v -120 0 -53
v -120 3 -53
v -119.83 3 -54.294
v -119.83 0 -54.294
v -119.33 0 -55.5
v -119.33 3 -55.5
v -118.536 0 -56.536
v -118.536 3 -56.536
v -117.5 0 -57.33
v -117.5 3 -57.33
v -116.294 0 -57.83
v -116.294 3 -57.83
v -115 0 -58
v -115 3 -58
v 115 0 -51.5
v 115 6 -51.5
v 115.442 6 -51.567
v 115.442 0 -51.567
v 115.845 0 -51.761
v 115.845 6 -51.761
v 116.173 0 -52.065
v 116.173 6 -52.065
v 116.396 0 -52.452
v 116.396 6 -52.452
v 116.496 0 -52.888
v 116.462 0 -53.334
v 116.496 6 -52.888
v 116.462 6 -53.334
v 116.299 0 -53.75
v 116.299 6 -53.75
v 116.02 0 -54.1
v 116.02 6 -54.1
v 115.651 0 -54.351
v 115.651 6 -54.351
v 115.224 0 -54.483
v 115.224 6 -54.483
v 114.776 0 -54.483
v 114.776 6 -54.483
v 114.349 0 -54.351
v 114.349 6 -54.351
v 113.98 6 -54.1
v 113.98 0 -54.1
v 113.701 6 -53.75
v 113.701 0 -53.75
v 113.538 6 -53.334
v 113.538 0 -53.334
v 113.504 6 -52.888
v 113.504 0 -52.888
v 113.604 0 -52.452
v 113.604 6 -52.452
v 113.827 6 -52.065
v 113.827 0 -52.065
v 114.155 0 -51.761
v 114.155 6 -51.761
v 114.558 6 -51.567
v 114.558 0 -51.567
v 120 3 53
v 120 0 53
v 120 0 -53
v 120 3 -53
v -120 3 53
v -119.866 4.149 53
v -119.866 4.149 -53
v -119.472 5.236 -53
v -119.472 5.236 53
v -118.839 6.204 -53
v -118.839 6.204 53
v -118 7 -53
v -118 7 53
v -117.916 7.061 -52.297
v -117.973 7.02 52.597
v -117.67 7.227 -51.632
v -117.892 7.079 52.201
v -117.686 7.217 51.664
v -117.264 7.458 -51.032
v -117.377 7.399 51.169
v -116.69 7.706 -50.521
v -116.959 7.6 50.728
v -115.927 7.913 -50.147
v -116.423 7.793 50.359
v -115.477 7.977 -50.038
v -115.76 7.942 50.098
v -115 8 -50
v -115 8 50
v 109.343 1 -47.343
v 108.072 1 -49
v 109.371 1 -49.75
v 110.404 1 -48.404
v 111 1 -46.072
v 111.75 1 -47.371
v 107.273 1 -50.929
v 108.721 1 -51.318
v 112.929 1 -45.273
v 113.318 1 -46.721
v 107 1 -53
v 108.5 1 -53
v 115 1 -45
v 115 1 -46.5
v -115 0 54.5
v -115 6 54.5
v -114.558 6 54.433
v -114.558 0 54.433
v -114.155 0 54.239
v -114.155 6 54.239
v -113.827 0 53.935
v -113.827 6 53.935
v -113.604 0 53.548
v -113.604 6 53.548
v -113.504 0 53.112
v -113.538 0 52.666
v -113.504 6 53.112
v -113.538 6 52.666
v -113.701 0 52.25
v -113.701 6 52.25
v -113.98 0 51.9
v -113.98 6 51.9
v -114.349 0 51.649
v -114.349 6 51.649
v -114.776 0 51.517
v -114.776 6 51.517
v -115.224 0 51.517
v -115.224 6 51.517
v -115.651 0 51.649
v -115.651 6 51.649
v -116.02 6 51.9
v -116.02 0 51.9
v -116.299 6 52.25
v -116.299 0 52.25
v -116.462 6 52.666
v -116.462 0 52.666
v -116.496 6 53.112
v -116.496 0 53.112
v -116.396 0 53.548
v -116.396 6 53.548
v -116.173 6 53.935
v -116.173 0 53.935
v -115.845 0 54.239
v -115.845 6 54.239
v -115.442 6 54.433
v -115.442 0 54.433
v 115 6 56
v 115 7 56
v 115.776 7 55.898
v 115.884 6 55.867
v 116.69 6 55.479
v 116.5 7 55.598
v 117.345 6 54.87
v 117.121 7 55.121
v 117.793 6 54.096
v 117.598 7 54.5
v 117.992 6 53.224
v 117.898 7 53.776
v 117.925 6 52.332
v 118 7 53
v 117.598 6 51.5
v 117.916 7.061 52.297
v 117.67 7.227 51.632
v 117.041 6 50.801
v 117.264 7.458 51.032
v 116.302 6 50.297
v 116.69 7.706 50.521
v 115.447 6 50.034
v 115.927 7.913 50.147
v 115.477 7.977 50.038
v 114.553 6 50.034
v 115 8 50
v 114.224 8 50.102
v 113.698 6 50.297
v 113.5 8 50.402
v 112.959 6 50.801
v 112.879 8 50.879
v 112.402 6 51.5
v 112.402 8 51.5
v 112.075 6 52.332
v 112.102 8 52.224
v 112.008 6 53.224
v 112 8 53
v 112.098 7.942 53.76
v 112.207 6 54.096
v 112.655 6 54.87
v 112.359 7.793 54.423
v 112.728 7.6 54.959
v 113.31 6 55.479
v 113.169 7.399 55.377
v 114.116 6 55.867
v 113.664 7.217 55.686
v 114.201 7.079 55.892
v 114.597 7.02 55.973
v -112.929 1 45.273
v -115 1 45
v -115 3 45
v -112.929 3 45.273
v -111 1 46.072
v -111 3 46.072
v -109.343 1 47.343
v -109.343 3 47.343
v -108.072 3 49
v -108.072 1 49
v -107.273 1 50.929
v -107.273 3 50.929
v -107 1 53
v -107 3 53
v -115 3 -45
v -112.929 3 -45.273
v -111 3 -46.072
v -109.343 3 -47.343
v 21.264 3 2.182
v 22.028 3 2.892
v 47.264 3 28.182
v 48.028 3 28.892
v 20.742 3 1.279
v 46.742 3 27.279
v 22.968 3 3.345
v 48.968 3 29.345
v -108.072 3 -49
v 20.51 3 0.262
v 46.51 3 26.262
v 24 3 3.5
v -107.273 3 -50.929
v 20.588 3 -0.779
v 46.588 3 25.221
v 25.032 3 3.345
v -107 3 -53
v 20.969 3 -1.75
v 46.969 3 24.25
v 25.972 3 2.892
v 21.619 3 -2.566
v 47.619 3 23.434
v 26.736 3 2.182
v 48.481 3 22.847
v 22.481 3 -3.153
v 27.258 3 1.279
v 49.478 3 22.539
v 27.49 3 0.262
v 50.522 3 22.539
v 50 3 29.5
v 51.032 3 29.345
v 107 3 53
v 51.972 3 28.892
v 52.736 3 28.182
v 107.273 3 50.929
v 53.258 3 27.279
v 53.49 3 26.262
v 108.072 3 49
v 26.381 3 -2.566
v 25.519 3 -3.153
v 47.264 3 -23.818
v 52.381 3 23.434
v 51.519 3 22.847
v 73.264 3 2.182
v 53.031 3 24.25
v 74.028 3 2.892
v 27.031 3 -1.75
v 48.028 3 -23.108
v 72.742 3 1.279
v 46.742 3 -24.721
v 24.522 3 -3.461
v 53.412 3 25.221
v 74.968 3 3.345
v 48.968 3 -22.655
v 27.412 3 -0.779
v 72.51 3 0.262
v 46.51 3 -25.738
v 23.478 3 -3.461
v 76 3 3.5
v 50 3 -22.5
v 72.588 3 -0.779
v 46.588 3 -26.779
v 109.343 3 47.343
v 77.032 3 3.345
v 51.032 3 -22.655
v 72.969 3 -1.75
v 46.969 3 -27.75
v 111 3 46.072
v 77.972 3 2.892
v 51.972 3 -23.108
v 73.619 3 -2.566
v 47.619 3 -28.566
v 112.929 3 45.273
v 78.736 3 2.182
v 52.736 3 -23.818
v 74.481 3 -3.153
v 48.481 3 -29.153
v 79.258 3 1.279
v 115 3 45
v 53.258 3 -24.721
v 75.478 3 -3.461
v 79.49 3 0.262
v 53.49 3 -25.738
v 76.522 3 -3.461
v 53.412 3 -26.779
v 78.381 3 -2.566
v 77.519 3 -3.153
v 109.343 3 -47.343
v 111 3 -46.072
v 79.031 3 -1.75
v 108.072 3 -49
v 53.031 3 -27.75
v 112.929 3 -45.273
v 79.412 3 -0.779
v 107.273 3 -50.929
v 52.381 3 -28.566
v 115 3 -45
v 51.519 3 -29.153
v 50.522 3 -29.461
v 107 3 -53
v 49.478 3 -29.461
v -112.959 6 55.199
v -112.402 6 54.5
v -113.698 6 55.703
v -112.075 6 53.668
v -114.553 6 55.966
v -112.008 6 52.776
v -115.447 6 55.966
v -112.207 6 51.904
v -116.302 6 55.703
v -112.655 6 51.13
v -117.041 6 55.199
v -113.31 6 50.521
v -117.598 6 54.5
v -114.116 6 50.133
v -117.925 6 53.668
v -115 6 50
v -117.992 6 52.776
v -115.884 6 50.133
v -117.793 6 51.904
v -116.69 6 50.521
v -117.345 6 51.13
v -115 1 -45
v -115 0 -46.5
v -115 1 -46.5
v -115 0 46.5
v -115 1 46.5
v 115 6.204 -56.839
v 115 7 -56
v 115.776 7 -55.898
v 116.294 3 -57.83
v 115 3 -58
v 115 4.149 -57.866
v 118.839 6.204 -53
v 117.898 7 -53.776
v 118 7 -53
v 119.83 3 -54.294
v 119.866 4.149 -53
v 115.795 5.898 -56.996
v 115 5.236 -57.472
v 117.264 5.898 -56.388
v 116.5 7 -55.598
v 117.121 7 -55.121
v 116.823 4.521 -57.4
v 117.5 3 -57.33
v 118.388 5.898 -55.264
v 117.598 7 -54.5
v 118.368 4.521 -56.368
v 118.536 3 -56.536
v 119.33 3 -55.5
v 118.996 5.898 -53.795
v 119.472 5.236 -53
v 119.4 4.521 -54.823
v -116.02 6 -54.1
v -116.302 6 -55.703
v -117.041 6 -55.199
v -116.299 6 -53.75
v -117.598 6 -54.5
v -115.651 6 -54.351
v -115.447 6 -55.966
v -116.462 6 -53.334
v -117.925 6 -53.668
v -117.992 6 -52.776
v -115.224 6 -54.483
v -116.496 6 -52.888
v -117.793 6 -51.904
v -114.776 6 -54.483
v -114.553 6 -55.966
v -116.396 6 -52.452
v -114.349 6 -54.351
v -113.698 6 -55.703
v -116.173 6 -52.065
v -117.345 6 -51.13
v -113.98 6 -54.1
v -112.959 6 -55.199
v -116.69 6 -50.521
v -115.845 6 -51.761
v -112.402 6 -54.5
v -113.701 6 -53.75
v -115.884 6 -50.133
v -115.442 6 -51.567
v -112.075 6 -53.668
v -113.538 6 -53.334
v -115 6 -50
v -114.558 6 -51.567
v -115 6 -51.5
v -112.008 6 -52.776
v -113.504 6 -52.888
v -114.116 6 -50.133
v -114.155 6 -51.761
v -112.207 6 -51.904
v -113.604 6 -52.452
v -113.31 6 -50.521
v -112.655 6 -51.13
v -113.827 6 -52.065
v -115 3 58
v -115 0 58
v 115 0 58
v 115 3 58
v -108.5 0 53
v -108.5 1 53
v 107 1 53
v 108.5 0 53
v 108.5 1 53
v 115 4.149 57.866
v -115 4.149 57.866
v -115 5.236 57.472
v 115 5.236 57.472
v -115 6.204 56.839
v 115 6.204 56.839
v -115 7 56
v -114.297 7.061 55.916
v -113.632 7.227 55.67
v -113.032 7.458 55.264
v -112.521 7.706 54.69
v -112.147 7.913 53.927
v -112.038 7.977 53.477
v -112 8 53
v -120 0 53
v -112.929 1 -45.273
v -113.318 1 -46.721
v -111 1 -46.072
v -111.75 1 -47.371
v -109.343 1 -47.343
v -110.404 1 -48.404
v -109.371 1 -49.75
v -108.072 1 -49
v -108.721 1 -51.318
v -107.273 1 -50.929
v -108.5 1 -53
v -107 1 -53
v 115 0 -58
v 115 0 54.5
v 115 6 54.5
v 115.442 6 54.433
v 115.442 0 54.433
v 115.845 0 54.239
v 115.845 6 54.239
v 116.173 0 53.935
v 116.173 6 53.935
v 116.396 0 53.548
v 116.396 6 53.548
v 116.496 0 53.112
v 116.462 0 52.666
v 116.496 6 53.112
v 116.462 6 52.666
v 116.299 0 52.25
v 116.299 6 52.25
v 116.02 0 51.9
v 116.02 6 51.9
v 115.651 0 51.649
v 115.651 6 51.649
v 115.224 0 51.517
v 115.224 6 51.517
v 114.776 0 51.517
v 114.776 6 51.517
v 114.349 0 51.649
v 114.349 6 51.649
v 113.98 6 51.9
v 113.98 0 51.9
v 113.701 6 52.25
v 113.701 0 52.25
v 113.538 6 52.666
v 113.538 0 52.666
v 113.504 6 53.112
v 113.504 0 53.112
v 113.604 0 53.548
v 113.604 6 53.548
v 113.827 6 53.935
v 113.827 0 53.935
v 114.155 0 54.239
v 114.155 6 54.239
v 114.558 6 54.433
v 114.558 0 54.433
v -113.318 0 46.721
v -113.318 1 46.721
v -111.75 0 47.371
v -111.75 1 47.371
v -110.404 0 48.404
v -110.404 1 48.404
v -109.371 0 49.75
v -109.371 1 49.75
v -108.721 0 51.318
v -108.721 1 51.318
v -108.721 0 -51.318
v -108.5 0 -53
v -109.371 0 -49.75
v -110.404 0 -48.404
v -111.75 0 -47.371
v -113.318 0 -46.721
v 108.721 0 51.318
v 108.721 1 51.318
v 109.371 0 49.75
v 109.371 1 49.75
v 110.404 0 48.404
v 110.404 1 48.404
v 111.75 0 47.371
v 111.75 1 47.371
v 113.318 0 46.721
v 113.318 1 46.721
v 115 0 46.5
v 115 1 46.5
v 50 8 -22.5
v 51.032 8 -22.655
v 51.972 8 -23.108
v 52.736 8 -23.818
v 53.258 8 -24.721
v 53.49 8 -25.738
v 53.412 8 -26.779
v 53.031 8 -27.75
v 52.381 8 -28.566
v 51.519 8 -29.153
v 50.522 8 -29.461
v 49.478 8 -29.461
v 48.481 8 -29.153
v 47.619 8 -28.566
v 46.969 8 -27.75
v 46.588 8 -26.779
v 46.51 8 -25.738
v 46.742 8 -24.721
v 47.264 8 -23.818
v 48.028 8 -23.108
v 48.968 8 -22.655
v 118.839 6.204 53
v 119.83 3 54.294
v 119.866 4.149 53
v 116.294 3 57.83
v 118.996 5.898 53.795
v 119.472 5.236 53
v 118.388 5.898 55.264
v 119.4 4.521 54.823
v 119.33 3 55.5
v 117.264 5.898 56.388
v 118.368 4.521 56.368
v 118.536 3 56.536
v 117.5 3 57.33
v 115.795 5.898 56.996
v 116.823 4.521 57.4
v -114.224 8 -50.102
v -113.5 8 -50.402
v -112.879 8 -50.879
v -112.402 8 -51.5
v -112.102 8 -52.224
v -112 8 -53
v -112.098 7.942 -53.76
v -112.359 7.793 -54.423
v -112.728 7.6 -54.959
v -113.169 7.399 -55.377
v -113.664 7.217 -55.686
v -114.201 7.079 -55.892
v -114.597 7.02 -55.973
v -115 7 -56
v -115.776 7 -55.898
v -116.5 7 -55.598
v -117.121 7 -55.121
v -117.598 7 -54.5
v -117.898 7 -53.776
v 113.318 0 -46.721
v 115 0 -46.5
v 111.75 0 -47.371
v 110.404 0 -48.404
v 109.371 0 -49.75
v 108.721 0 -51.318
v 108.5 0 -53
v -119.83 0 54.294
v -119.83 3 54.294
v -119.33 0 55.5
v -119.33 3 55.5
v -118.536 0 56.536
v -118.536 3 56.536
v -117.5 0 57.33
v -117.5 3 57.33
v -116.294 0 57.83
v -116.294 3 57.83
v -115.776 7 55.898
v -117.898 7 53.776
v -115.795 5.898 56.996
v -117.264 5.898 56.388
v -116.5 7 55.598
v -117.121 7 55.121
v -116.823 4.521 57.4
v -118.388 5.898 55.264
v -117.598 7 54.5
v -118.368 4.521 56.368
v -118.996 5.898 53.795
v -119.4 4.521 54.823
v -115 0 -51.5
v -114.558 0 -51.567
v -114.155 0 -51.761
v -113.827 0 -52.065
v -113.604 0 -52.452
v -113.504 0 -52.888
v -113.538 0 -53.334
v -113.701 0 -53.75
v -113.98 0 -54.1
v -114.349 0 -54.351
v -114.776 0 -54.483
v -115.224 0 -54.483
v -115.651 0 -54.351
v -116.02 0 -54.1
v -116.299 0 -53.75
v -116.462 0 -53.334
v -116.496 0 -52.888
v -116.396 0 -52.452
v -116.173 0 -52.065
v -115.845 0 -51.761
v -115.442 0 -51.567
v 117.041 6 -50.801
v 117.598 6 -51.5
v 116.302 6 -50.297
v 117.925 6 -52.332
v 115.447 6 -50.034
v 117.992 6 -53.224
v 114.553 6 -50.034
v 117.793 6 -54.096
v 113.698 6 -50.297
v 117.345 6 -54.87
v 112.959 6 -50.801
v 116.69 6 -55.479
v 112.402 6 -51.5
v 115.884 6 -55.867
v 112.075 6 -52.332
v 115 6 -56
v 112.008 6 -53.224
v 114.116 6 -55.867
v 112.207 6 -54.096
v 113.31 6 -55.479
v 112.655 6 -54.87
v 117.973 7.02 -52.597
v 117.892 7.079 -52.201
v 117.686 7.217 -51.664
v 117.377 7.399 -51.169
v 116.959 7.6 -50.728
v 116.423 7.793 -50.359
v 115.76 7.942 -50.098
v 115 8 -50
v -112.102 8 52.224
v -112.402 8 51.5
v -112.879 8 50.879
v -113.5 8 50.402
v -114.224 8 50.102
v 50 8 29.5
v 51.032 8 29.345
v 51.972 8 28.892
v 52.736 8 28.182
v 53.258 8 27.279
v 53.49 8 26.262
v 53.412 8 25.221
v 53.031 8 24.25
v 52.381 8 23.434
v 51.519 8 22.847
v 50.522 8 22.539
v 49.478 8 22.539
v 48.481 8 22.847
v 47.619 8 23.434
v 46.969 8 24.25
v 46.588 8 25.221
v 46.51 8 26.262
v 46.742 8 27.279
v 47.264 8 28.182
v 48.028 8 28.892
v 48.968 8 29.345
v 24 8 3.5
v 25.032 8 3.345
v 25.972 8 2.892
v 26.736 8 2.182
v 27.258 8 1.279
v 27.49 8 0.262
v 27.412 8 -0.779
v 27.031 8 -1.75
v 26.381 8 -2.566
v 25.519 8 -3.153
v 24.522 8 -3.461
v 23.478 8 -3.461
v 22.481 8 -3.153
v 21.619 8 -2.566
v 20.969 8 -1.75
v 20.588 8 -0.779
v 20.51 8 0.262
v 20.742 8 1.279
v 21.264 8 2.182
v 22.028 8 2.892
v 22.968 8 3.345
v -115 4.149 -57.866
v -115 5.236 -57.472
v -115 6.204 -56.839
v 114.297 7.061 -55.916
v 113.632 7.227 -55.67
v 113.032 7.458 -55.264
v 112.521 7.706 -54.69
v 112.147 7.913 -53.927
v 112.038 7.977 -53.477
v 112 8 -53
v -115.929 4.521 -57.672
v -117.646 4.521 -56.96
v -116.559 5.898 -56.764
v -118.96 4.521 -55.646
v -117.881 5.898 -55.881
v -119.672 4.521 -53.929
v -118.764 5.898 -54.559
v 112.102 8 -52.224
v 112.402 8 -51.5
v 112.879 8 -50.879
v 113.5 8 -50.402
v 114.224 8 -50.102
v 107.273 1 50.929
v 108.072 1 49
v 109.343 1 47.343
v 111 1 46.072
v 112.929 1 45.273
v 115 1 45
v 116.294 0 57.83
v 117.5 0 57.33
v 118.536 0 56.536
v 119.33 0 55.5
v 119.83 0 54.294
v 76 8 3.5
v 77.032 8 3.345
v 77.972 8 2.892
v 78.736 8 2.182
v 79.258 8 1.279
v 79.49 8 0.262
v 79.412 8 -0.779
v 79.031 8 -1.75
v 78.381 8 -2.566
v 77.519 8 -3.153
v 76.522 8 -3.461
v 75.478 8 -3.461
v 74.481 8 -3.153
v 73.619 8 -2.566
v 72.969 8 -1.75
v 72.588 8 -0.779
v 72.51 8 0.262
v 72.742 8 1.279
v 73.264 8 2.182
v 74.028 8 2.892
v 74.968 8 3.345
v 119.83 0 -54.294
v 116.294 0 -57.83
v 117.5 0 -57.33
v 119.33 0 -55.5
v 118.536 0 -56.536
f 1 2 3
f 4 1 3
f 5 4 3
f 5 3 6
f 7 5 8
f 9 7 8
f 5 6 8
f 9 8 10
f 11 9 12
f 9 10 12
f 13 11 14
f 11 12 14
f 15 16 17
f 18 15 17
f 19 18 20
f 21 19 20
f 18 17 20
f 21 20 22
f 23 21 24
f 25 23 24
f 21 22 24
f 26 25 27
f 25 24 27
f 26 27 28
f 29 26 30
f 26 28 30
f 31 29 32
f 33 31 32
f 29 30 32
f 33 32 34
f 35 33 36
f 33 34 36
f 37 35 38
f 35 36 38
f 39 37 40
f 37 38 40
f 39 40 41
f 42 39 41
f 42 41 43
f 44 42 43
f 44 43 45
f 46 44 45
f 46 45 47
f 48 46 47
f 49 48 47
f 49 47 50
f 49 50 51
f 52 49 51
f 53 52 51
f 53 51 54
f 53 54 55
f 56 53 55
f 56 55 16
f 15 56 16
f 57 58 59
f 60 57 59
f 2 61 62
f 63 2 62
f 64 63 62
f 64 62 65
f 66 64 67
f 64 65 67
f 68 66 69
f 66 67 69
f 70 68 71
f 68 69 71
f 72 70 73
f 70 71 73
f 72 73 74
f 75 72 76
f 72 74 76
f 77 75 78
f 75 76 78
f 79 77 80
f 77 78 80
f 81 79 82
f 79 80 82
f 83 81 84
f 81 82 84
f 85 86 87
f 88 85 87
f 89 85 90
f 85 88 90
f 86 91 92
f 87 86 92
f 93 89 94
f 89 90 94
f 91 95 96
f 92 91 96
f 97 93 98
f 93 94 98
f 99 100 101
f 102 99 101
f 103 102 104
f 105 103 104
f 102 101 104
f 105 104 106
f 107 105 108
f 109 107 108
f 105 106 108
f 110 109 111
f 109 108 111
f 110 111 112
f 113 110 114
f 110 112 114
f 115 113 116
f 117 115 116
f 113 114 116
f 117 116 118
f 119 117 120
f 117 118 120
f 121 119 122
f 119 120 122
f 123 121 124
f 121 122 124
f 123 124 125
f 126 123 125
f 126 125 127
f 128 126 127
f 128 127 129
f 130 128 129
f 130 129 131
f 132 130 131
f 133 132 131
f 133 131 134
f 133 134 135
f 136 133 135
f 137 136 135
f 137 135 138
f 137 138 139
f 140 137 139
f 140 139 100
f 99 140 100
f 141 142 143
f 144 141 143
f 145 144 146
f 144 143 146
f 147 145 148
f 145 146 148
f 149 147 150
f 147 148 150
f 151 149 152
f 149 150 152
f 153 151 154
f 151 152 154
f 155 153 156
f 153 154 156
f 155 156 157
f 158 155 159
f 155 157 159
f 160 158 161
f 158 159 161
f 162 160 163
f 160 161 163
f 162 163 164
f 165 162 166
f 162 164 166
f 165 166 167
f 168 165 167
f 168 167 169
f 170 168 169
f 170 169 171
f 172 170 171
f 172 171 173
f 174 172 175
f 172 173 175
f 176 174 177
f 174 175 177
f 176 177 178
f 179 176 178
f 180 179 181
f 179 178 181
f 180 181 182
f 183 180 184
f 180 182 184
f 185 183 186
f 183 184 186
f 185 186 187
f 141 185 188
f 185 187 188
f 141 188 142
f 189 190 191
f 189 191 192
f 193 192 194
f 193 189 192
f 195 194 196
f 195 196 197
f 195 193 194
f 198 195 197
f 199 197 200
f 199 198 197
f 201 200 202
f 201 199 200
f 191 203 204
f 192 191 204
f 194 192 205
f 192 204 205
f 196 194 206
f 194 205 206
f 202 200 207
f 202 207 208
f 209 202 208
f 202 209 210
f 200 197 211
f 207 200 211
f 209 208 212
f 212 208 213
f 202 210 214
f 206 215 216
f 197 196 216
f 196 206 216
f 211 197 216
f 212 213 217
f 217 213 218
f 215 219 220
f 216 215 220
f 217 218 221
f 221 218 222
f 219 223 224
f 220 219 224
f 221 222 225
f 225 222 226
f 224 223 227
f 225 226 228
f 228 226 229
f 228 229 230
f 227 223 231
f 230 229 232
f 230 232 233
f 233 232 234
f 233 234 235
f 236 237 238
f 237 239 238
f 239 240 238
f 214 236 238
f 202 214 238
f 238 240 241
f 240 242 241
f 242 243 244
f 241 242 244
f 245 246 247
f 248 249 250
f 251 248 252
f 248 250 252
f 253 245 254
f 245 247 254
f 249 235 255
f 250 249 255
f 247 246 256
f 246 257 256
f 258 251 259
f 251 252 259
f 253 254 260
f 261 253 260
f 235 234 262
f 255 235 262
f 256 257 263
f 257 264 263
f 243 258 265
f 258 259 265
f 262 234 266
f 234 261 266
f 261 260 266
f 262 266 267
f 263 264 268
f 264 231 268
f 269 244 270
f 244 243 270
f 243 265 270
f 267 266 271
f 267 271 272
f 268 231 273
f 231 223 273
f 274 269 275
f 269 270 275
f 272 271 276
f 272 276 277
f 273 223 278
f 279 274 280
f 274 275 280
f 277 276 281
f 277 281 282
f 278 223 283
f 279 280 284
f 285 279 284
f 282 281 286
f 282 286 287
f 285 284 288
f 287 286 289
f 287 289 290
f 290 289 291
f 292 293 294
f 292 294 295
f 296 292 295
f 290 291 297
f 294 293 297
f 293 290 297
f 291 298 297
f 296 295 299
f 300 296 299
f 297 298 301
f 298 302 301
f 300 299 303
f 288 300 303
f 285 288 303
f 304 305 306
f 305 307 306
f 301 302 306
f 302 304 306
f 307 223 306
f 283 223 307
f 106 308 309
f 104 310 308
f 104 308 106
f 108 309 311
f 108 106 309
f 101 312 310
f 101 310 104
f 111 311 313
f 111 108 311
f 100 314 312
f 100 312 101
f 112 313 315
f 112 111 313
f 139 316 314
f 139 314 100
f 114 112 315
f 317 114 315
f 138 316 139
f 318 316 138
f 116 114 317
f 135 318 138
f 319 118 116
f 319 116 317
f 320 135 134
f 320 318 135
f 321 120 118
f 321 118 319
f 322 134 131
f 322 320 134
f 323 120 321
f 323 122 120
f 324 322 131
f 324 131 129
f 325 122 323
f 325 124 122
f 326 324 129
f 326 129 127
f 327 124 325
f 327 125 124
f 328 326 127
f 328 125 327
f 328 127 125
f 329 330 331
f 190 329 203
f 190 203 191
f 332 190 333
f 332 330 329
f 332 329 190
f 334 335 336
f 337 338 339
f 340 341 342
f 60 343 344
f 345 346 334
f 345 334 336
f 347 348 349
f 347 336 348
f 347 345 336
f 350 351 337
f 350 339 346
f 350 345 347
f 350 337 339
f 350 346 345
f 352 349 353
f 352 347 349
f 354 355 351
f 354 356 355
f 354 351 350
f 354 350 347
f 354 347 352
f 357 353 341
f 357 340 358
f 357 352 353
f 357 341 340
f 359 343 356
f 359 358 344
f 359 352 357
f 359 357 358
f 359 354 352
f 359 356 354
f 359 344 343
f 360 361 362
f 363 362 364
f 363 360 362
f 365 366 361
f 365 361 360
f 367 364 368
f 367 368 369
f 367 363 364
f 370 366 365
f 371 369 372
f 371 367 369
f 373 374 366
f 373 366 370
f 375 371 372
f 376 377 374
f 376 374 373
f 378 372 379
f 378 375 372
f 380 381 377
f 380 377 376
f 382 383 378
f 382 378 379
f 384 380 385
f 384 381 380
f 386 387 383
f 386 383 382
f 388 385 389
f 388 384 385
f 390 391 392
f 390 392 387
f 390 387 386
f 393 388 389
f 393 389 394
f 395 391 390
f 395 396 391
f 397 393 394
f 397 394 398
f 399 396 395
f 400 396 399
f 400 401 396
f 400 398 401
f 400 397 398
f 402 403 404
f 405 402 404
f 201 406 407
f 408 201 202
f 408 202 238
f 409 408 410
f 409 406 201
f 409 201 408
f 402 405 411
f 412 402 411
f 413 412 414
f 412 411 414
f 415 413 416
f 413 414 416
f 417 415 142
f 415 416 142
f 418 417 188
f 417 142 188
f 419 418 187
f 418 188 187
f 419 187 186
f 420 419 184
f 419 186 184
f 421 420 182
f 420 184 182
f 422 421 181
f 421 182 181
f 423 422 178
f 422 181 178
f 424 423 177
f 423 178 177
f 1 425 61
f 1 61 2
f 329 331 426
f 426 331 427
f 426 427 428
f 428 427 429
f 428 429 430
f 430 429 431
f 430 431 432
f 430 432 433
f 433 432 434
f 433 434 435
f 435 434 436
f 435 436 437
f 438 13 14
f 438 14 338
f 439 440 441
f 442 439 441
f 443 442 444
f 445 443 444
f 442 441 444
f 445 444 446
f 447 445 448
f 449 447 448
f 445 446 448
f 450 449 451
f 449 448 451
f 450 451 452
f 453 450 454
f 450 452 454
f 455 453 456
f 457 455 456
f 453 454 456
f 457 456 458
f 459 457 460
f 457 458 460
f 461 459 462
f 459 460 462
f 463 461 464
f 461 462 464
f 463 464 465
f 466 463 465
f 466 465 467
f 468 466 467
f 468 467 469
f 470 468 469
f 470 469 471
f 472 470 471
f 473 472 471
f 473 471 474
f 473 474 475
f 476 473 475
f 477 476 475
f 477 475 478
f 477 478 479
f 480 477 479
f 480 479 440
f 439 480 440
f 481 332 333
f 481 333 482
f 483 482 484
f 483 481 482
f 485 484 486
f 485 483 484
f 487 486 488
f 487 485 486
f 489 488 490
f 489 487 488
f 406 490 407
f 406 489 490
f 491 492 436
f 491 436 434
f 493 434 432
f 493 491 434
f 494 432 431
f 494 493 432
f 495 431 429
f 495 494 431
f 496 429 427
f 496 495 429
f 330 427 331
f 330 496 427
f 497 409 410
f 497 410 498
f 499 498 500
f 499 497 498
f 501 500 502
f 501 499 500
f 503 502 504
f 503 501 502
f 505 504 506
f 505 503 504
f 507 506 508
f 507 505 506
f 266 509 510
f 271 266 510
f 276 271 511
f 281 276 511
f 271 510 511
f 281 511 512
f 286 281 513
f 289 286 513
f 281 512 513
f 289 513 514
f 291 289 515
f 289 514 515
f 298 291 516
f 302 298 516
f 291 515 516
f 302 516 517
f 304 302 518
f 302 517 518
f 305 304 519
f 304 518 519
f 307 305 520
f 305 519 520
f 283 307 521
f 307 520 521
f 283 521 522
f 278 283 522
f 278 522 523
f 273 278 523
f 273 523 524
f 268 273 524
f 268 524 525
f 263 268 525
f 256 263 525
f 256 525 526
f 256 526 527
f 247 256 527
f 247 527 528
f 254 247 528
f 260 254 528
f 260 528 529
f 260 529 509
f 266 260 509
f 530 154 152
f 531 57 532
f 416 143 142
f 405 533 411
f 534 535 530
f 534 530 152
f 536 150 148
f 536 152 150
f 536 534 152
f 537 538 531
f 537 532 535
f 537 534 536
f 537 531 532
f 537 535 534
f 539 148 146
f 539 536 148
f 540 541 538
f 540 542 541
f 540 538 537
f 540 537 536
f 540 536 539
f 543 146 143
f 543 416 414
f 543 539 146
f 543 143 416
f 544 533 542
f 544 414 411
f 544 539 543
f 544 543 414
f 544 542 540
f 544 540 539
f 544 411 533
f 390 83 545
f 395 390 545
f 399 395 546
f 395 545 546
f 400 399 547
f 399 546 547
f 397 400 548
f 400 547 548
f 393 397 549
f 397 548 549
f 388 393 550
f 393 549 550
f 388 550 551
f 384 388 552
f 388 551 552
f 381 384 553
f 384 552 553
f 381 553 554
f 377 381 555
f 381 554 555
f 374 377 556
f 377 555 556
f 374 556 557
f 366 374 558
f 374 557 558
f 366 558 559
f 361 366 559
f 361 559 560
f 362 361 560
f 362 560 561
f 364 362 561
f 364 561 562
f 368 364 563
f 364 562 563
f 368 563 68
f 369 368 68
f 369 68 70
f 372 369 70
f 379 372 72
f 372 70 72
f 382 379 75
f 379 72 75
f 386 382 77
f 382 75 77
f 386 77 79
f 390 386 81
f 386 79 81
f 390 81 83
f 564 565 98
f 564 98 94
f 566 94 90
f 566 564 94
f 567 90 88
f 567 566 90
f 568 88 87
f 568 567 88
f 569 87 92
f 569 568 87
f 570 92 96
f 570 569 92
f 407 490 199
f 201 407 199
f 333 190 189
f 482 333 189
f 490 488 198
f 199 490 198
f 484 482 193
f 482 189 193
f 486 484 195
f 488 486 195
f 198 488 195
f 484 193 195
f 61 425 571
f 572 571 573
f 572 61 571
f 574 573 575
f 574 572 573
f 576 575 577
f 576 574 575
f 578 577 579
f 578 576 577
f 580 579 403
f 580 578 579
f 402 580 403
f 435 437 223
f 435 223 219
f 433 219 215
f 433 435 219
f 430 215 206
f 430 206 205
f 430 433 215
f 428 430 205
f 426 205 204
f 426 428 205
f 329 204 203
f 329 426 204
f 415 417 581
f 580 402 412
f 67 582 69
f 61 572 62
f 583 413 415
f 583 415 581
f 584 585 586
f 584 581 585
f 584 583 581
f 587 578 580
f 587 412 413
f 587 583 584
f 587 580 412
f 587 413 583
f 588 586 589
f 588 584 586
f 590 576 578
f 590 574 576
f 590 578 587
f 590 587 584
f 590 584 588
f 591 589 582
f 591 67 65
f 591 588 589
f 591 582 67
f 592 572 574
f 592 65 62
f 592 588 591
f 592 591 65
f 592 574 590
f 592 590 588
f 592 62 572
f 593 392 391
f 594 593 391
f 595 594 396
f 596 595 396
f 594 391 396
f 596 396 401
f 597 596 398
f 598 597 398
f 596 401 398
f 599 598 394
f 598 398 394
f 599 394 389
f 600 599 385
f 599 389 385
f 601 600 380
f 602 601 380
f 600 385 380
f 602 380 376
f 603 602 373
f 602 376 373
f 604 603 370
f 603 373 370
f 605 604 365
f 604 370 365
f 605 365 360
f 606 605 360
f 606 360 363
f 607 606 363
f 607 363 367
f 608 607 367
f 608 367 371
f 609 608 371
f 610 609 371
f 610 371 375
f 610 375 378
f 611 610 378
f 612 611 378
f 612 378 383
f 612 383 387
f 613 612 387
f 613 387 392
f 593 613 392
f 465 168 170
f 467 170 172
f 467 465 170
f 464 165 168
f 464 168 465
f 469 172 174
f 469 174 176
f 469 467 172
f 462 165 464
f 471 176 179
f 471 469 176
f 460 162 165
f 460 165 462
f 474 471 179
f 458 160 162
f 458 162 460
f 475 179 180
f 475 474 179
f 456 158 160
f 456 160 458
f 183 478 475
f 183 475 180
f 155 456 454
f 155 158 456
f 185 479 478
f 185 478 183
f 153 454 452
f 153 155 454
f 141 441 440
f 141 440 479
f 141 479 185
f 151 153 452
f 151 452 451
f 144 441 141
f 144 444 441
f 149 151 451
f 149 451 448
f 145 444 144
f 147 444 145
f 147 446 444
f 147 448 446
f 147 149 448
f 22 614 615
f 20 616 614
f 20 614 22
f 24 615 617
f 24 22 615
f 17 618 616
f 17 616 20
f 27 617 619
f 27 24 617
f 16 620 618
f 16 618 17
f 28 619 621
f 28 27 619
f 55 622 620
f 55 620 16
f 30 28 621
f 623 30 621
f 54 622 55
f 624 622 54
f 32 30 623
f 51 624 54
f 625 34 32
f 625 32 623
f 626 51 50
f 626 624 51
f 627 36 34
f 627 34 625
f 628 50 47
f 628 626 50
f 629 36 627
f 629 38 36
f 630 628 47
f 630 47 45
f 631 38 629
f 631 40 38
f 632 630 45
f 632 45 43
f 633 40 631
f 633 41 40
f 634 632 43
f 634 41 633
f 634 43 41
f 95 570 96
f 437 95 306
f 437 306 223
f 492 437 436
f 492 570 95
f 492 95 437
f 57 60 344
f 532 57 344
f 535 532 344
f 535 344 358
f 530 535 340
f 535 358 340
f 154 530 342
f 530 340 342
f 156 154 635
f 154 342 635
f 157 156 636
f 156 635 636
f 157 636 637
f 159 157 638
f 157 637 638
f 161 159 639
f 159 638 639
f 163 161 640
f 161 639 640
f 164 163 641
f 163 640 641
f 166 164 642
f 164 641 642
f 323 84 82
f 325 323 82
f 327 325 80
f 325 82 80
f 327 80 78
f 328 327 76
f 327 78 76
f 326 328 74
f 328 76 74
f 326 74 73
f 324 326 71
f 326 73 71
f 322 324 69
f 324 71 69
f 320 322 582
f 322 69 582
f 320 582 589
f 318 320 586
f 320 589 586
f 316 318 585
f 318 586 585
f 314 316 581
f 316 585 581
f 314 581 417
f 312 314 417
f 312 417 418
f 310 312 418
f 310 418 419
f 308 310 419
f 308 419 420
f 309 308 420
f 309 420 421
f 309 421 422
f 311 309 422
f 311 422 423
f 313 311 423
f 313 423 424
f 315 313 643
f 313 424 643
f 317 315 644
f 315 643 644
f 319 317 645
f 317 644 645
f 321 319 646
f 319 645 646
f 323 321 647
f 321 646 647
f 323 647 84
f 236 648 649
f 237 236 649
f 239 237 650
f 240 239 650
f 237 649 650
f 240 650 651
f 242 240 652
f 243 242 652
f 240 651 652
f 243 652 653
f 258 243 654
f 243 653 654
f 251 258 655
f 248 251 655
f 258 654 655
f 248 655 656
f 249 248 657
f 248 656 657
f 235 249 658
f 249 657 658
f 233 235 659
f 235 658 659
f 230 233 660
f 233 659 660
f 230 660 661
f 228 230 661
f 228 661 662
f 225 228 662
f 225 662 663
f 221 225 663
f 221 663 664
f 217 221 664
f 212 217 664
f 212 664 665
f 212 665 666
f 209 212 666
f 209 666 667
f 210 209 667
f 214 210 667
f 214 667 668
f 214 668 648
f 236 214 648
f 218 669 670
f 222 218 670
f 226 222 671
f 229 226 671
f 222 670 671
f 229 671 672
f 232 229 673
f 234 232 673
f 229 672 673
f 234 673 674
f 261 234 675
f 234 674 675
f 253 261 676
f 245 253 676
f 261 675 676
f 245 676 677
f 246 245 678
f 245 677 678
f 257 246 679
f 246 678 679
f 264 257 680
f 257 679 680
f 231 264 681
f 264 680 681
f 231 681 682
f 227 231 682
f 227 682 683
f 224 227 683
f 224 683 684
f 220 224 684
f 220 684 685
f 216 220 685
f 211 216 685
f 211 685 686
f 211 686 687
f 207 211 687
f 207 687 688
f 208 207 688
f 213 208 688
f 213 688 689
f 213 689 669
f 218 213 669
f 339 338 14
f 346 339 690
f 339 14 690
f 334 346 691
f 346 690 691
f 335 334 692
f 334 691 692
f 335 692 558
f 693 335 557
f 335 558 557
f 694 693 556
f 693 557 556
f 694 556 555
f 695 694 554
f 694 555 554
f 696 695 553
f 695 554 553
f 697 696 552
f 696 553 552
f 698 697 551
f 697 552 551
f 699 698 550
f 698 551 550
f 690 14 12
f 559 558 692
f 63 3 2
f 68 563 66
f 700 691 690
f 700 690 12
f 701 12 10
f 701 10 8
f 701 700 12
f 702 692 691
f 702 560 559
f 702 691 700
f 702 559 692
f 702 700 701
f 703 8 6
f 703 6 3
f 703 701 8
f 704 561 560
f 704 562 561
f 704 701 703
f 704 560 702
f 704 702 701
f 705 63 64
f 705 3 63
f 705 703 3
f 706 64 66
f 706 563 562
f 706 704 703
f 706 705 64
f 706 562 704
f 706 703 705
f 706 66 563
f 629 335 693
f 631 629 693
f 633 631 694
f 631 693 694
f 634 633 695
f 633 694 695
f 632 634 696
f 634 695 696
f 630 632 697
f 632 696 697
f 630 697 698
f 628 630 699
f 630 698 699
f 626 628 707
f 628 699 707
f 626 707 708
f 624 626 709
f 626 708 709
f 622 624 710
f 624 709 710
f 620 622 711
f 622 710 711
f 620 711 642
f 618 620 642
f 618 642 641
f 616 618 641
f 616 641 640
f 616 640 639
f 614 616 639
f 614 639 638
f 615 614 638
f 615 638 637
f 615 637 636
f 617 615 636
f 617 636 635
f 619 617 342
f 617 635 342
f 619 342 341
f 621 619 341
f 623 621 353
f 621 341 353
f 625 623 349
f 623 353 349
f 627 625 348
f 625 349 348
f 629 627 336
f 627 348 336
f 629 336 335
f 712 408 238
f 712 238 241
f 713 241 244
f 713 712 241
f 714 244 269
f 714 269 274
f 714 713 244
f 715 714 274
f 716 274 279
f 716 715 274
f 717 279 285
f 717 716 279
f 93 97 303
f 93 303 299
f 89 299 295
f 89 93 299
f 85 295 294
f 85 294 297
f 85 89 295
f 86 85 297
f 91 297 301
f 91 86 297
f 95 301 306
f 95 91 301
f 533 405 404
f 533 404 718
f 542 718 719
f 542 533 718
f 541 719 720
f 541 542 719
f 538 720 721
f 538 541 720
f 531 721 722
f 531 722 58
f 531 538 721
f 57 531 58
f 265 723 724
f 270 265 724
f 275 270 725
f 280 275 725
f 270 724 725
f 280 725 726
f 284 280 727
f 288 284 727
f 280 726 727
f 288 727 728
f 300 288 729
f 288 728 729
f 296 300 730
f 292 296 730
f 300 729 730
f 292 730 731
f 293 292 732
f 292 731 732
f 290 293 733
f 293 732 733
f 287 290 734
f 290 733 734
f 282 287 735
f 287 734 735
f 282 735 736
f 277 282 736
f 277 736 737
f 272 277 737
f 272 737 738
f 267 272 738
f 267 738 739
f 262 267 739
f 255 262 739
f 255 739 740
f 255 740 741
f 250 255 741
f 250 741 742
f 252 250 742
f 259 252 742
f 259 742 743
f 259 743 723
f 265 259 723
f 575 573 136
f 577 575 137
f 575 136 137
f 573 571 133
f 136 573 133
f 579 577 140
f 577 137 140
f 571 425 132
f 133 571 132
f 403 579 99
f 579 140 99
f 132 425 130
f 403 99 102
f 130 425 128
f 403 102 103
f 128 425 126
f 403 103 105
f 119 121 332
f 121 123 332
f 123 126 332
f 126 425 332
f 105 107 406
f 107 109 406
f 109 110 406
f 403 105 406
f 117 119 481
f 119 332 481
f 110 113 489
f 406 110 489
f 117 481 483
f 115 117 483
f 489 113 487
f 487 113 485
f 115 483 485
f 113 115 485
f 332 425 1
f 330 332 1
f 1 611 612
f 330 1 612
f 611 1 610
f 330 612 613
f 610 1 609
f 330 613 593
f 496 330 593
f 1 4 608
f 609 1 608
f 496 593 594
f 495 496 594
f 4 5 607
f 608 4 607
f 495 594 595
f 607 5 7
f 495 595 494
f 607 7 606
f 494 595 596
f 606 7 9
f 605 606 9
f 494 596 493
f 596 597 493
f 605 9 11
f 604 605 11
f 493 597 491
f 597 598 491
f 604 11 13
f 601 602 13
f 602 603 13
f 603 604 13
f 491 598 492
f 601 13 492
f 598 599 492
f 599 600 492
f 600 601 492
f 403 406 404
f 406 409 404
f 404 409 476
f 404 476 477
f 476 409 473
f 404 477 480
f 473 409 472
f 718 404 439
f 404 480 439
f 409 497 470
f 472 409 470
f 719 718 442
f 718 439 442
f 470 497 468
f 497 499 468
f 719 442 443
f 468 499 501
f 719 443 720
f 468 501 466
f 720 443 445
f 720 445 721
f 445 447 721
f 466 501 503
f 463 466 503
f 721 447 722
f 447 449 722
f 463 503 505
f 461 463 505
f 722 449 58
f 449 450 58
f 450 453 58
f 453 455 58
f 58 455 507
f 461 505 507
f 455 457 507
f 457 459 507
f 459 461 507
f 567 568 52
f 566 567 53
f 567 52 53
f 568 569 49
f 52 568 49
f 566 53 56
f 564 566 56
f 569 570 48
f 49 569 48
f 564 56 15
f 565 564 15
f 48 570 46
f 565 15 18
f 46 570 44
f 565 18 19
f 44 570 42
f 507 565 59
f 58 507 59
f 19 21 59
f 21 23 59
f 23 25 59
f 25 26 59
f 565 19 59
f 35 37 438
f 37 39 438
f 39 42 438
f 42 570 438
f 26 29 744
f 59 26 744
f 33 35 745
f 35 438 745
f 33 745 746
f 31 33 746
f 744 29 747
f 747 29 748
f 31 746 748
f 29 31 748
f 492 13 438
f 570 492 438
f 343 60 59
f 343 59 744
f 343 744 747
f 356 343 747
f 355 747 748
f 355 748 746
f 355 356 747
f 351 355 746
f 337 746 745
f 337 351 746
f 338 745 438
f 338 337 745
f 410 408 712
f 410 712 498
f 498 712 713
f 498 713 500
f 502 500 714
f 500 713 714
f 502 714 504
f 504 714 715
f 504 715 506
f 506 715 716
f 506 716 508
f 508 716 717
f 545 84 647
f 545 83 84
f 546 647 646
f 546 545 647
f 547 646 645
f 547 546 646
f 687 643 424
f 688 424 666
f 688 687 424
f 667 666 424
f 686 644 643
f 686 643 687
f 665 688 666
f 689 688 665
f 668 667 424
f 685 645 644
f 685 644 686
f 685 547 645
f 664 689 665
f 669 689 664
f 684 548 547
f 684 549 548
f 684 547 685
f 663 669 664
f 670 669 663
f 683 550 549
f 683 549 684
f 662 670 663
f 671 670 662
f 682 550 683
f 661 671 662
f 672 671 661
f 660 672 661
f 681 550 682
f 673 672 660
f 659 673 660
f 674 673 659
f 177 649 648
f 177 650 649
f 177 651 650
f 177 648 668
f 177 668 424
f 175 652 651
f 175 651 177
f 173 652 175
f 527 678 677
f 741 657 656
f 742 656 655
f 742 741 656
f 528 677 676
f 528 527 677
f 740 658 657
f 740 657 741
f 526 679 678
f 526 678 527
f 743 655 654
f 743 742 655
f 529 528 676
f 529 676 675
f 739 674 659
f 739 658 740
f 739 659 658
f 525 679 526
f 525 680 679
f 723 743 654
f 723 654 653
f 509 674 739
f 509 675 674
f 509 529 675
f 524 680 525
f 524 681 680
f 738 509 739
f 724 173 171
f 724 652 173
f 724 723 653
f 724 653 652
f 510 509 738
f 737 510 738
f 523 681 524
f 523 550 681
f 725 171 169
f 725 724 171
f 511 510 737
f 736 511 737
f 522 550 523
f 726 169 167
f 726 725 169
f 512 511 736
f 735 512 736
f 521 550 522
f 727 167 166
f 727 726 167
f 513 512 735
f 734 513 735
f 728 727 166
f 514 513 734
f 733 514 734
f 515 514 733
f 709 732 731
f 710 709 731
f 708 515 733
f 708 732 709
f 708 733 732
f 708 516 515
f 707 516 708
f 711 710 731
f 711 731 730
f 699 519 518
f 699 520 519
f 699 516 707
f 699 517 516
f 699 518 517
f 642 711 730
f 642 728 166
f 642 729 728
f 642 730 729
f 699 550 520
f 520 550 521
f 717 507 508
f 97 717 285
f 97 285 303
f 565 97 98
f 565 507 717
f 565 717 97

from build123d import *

# Parameters (mm, degrees)
SKETCH1_W           = 240
SKETCH1_H           = 116
BOSS_EXTRUDE1_DEPTH = 8
FILLET1_R           = 5
CUT_EXTRUDE1_REACH  = 135.522
SKETCH2_R           = 1.5
FILLET2_R           = 5
SKETCH3_R           = 3
SKETCH3_R_2         = 1.5
CUT_EXTRUDE2_DEPTH  = 2
SHELL1_DEPTH        = 3
SHELL1_2_DEPTH      = 1
CUT_EXTRUDE3_REACH  = 135.522
SKETCH4_R           = 3.5


# Read off the part's stored shape, not the designer's step: Shell1
with BuildPart() as part:
    # Sketch1 → Boss-Extrude1 (new body)
    with BuildSketch(Plane(origin=(0, 0, 0), x_dir=(1, 0, 0), z_dir=(0, 1, 0))):
        Rectangle(SKETCH1_W, SKETCH1_H)
    extrude(amount=BOSS_EXTRUDE1_DEPTH)

    # Fillet1
    fillet1_edges = [part.edges().sort_by_distance(p)[0] for p in [
        (120, 4, 58),
        (-120, 4, 58),
        (-120, 4, -58),
        (120, 4, -58),
    ]]
    fillet(fillet1_edges, radius=FILLET1_R)

    # Sketch2 → Cut-Extrude1 (cut, up to next)
    with BuildSketch(Plane(origin=(0, 8, 0), x_dir=(1, 0, 0), z_dir=(0, 1, 0)), mode=Mode.PRIVATE) as cut_extrude1_sk1:
        with Locations(Location((-115, -53, 0), (0, 0, 270))):
            Circle(SKETCH2_R)
    cut_extrude1_tool1 = extrude(cut_extrude1_sk1.sketch, amount=-CUT_EXTRUDE1_REACH, mode=Mode.PRIVATE) & part.part
    # Sketch2 → Cut-Extrude1 (cut, up to next)
    with BuildSketch(Plane(origin=(0, 8, 0), x_dir=(1, 0, 0), z_dir=(0, 1, 0)), mode=Mode.PRIVATE) as cut_extrude1_sk2:
        with Locations(Location((-115, 53, 0), (0, 0, 270))):
            Circle(SKETCH2_R)
    cut_extrude1_tool2 = extrude(cut_extrude1_sk2.sketch, amount=-CUT_EXTRUDE1_REACH, mode=Mode.PRIVATE) & part.part
    # Sketch2 → Cut-Extrude1 (cut, up to next)
    with BuildSketch(Plane(origin=(0, 8, 0), x_dir=(1, 0, 0), z_dir=(0, 1, 0)), mode=Mode.PRIVATE) as cut_extrude1_sk3:
        with Locations(Location((115, 53, 0), (0, 0, 270))):
            Circle(SKETCH2_R)
    cut_extrude1_tool3 = extrude(cut_extrude1_sk3.sketch, amount=-CUT_EXTRUDE1_REACH, mode=Mode.PRIVATE) & part.part
    # Sketch2 → Cut-Extrude1 (cut, up to next)
    with BuildSketch(Plane(origin=(0, 8, 0), x_dir=(1, 0, 0), z_dir=(0, 1, 0)), mode=Mode.PRIVATE) as cut_extrude1_sk4:
        with Locations(Location((115, -53, 0), (0, 0, 270))):
            Circle(SKETCH2_R)
    cut_extrude1_tool4 = extrude(cut_extrude1_sk4.sketch, amount=-CUT_EXTRUDE1_REACH, mode=Mode.PRIVATE) & part.part
    add(cut_extrude1_tool1.solids().sort_by_distance((-115, 8, 53))[0], mode=Mode.SUBTRACT)
    add(cut_extrude1_tool2.solids().sort_by_distance((-115, 8, -53))[0], mode=Mode.SUBTRACT)
    add(cut_extrude1_tool3.solids().sort_by_distance((115, 8, -53))[0], mode=Mode.SUBTRACT)
    add(cut_extrude1_tool4.solids().sort_by_distance((115, 8, 53))[0], mode=Mode.SUBTRACT)

    # Fillet2
    # the kernel refuses this fillet: 5 mm, written as the material it takes off along each edge
    with BuildSketch(Plane(origin=(-115, 8, -58), x_dir=(0, -1, 0), z_dir=(1, 0, 0))) as fillet2_piece_1:
        with BuildLine():
            CenterArc((FILLET2_R, -FILLET2_R), FILLET2_R, 90, 90)
            Line((0, -FILLET2_R), (0, 0))
            Line((0, 0), (FILLET2_R, 0))
        make_face()
    extrude(amount=230, mode=Mode.SUBTRACT)
    with BuildSketch(Plane(origin=(120, 8, -53), x_dir=(-1, 0, 0), z_dir=(0, 0, 1)), Plane(origin=(-120, 8, 53), x_dir=(1, 0, 0), z_dir=(0, 0, -1))) as fillet2_piece_2:
        with BuildLine():
            CenterArc((FILLET2_R, FILLET2_R), FILLET2_R, 180, 90)
            Line((0, FILLET2_R), (0, 0))
            Line((0, 0), (FILLET2_R, 0))
        make_face()
    extrude(amount=106, mode=Mode.SUBTRACT)
    with BuildSketch(Plane(origin=(115, 8, 58), x_dir=(0, 0, -1), z_dir=(-1, 0, 0))) as fillet2_piece_3:
        with BuildLine():
            CenterArc((FILLET2_R, FILLET2_R), FILLET2_R, 180, 90)
            Line((0, FILLET2_R), (0, 0))
            Line((0, 0), (FILLET2_R, 0))
        make_face()
    extrude(amount=230, mode=Mode.SUBTRACT)
    with BuildSketch(Plane(origin=(-115, 8, 53), x_dir=(0, 0, 1), z_dir=(1, 0, 0))) as fillet2_piece_4:
        with BuildLine():
            CenterArc((5 - FILLET2_R, FILLET2_R), FILLET2_R, 270, 90)
            Line((5, FILLET2_R), (5, 0))
            Line((5, 0), (5 - FILLET2_R, 0))
        make_face()
    revolve(axis=Axis((-115, 8, 53), (0, -1, 0)), revolution_arc=90, mode=Mode.SUBTRACT)
    with BuildSketch(Plane(origin=(-115, 8, -53), x_dir=(0, 0, -1), z_dir=(1, 0, 0))) as fillet2_piece_5:
        with BuildLine():
            CenterArc((5 - FILLET2_R, -FILLET2_R), FILLET2_R, 0, 90)
            Line((5 - FILLET2_R, 0), (5, 0))
            Line((5, 0), (5, -FILLET2_R))
        make_face()
    revolve(axis=Axis((-115, 8, -53), (0, 1, 0)), revolution_arc=90, mode=Mode.SUBTRACT)
    with BuildSketch(Plane(origin=(115, 8, 53), x_dir=(1, 0, 0), z_dir=(0, 0, -1))) as fillet2_piece_6:
        with BuildLine():
            CenterArc((5 - FILLET2_R, FILLET2_R), FILLET2_R, 270, 90)
            Line((5, FILLET2_R), (5, 0))
            Line((5, 0), (5 - FILLET2_R, 0))
        make_face()
    revolve(axis=Axis((115, 8, 53), (0, -1, 0)), revolution_arc=90, mode=Mode.SUBTRACT)
    with BuildSketch(Plane(origin=(115, 8, -53), x_dir=(0, 0, -1), z_dir=(-1, 0, 0))) as fillet2_piece_7:
        with BuildLine():
            CenterArc((5 - FILLET2_R, FILLET2_R), FILLET2_R, 270, 90)
            Line((5 - FILLET2_R, 0), (5, 0))
            Line((5, 0), (5, FILLET2_R))
        make_face()
    revolve(axis=Axis((115, 8, -53), (0, -1, 0)), revolution_arc=90, mode=Mode.SUBTRACT)

    # Sketch3 → Cut-Extrude2 (cut)
    # profile 1 of 4: a face of its own
    with BuildSketch(Plane(origin=(0, 8, 0), x_dir=(1, 0, 0), z_dir=(0, 1, 0))):
        with Locations(Location((-115, 53, 0), (0, 0, 270))):
            Circle(SKETCH3_R)
        with Locations(Location((-115, 53, 0), (0, 0, 270))):
            Circle(SKETCH3_R_2, mode=Mode.SUBTRACT)
    # profile 2 of 4: a face of its own
    with BuildSketch(Plane(origin=(0, 8, 0), x_dir=(1, 0, 0), z_dir=(0, 1, 0))):
        with Locations(Location((-115, -53, 0), (0, 0, 90))):
            Circle(SKETCH3_R)
        with Locations(Location((-115, -53, 0), (0, 0, 270))):
            Circle(SKETCH3_R_2, mode=Mode.SUBTRACT)
    # profile 3 of 4: a face of its own
    with BuildSketch(Plane(origin=(0, 8, 0), x_dir=(1, 0, 0), z_dir=(0, 1, 0))):
        with Locations(Location((115, -53, 0), (0, 0, 270))):
            Circle(SKETCH3_R)
        with Locations(Location((115, -53, 0), (0, 0, 270))):
            Circle(SKETCH3_R_2, mode=Mode.SUBTRACT)
    # profile 4 of 4: a face of its own
    with BuildSketch(Plane(origin=(0, 8, 0), x_dir=(1, 0, 0), z_dir=(0, 1, 0))):
        with Locations(Location((115, 53, 0), (0, 0, 90))):
            Circle(SKETCH3_R)
        with Locations(Location((115, 53, 0), (0, 0, 270))):
            Circle(SKETCH3_R_2, mode=Mode.SUBTRACT)
    extrude(amount=-CUT_EXTRUDE2_DEPTH, mode=Mode.SUBTRACT)

    # Shell1 outline → Shell1 (cut)
    with BuildSketch(Plane(origin=(0, 0, 0), x_dir=(1, 0, 0), z_dir=(0, 1, 0))):
        with BuildLine():
            ThreePointArc((-107, 53), (-109.343145751, 47.343145751), (-115, 45))
            Line((-115, 45), (-115, -45))
            ThreePointArc((-115, -45), (-109.343145751, -47.343145751), (-107, -53))
            Line((-107, -53), (107, -53))
            ThreePointArc((107, -53), (109.343145751, -47.343145751), (115, -45))
            Line((115, -45), (115, 45))
            ThreePointArc((115, 45), (109.343145751, 47.343145751), (107, 53))
            Line((107, 53), (-107, 53))
        make_face()
    extrude(amount=SHELL1_DEPTH, mode=Mode.SUBTRACT)

    # Shell1 2 outline → Shell1 2 (cut)
    with BuildSketch(Plane(origin=(0, 0, 0), x_dir=(1, 0, 0), z_dir=(0, 1, 0))):
        with BuildLine():
            Line((-115, 46.5), (-115, 45))
            ThreePointArc((-115, 45), (-109.343145751, 47.343145751), (-107, 53))
            Line((-107, 53), (-108.5, 53))
            ThreePointArc((-108.5, 53), (-110.403805922, 48.403805922), (-115, 46.5))
        make_face()
        with BuildLine():
            ThreePointArc((-107, -53), (-109.343145751, -47.343145751), (-115, -45))
            Line((-115, -45), (-115, -46.5))
            ThreePointArc((-115, -46.5), (-110.403805922, -48.403805922), (-108.5, -53))
            Line((-108.5, -53), (-107, -53))
        make_face()
        with BuildLine():
            Line((108.5, 53), (107, 53))
            ThreePointArc((107, 53), (109.343145751, 47.343145751), (115, 45))
            Line((115, 45), (115, 46.5))
            ThreePointArc((115, 46.5), (110.403805922, 48.403805922), (108.5, 53))
        make_face()
        with BuildLine():
            ThreePointArc((115, -45), (109.343145751, -47.343145751), (107, -53))
            Line((107, -53), (108.5, -53))
            ThreePointArc((108.5, -53), (110.403805922, -48.403805922), (115, -46.5))
            Line((115, -46.5), (115, -45))
        make_face()
    extrude(amount=SHELL1_2_DEPTH, mode=Mode.SUBTRACT)

    # Sketch4 → Cut-Extrude3 (cut, up to next)
    with BuildSketch(Plane(origin=(0, 8, 0), x_dir=(1, 0, 0), z_dir=(0, 1, 0)), mode=Mode.PRIVATE) as cut_extrude3_sk1:
        with Locations(Location((24, 0, 0), (0, 0, 270))):
            Circle(SKETCH4_R)
    cut_extrude3_tool1 = extrude(cut_extrude3_sk1.sketch, amount=-CUT_EXTRUDE3_REACH, mode=Mode.PRIVATE) & part.part
    # Sketch4 → Cut-Extrude3 (cut, up to next)
    with BuildSketch(Plane(origin=(0, 8, 0), x_dir=(1, 0, 0), z_dir=(0, 1, 0)), mode=Mode.PRIVATE) as cut_extrude3_sk2:
        with Locations(Location((50, 26, 0), (0, 0, 270))):
            Circle(SKETCH4_R)
    cut_extrude3_tool2 = extrude(cut_extrude3_sk2.sketch, amount=-CUT_EXTRUDE3_REACH, mode=Mode.PRIVATE) & part.part
    # Sketch4 → Cut-Extrude3 (cut, up to next)
    with BuildSketch(Plane(origin=(0, 8, 0), x_dir=(1, 0, 0), z_dir=(0, 1, 0)), mode=Mode.PRIVATE) as cut_extrude3_sk3:
        with Locations(Location((76, 0, 0), (0, 0, 270))):
            Circle(SKETCH4_R)
    cut_extrude3_tool3 = extrude(cut_extrude3_sk3.sketch, amount=-CUT_EXTRUDE3_REACH, mode=Mode.PRIVATE) & part.part
    # Sketch4 → Cut-Extrude3 (cut, up to next)
    with BuildSketch(Plane(origin=(0, 8, 0), x_dir=(1, 0, 0), z_dir=(0, 1, 0)), mode=Mode.PRIVATE) as cut_extrude3_sk4:
        with Locations(Location((50, -26, 0), (0, 0, 270))):
            Circle(SKETCH4_R)
    cut_extrude3_tool4 = extrude(cut_extrude3_sk4.sketch, amount=-CUT_EXTRUDE3_REACH, mode=Mode.PRIVATE) & part.part
    add(cut_extrude3_tool1.solids().sort_by_distance((24, 8, 0))[0], mode=Mode.SUBTRACT)
    add(cut_extrude3_tool2.solids().sort_by_distance((50, 8, -26))[0], mode=Mode.SUBTRACT)
    add(cut_extrude3_tool3.solids().sort_by_distance((76, 8, 0))[0], mode=Mode.SUBTRACT)
    add(cut_extrude3_tool4.solids().sort_by_distance((50, 8, 26))[0], mode=Mode.SUBTRACT)


solid = part.part
